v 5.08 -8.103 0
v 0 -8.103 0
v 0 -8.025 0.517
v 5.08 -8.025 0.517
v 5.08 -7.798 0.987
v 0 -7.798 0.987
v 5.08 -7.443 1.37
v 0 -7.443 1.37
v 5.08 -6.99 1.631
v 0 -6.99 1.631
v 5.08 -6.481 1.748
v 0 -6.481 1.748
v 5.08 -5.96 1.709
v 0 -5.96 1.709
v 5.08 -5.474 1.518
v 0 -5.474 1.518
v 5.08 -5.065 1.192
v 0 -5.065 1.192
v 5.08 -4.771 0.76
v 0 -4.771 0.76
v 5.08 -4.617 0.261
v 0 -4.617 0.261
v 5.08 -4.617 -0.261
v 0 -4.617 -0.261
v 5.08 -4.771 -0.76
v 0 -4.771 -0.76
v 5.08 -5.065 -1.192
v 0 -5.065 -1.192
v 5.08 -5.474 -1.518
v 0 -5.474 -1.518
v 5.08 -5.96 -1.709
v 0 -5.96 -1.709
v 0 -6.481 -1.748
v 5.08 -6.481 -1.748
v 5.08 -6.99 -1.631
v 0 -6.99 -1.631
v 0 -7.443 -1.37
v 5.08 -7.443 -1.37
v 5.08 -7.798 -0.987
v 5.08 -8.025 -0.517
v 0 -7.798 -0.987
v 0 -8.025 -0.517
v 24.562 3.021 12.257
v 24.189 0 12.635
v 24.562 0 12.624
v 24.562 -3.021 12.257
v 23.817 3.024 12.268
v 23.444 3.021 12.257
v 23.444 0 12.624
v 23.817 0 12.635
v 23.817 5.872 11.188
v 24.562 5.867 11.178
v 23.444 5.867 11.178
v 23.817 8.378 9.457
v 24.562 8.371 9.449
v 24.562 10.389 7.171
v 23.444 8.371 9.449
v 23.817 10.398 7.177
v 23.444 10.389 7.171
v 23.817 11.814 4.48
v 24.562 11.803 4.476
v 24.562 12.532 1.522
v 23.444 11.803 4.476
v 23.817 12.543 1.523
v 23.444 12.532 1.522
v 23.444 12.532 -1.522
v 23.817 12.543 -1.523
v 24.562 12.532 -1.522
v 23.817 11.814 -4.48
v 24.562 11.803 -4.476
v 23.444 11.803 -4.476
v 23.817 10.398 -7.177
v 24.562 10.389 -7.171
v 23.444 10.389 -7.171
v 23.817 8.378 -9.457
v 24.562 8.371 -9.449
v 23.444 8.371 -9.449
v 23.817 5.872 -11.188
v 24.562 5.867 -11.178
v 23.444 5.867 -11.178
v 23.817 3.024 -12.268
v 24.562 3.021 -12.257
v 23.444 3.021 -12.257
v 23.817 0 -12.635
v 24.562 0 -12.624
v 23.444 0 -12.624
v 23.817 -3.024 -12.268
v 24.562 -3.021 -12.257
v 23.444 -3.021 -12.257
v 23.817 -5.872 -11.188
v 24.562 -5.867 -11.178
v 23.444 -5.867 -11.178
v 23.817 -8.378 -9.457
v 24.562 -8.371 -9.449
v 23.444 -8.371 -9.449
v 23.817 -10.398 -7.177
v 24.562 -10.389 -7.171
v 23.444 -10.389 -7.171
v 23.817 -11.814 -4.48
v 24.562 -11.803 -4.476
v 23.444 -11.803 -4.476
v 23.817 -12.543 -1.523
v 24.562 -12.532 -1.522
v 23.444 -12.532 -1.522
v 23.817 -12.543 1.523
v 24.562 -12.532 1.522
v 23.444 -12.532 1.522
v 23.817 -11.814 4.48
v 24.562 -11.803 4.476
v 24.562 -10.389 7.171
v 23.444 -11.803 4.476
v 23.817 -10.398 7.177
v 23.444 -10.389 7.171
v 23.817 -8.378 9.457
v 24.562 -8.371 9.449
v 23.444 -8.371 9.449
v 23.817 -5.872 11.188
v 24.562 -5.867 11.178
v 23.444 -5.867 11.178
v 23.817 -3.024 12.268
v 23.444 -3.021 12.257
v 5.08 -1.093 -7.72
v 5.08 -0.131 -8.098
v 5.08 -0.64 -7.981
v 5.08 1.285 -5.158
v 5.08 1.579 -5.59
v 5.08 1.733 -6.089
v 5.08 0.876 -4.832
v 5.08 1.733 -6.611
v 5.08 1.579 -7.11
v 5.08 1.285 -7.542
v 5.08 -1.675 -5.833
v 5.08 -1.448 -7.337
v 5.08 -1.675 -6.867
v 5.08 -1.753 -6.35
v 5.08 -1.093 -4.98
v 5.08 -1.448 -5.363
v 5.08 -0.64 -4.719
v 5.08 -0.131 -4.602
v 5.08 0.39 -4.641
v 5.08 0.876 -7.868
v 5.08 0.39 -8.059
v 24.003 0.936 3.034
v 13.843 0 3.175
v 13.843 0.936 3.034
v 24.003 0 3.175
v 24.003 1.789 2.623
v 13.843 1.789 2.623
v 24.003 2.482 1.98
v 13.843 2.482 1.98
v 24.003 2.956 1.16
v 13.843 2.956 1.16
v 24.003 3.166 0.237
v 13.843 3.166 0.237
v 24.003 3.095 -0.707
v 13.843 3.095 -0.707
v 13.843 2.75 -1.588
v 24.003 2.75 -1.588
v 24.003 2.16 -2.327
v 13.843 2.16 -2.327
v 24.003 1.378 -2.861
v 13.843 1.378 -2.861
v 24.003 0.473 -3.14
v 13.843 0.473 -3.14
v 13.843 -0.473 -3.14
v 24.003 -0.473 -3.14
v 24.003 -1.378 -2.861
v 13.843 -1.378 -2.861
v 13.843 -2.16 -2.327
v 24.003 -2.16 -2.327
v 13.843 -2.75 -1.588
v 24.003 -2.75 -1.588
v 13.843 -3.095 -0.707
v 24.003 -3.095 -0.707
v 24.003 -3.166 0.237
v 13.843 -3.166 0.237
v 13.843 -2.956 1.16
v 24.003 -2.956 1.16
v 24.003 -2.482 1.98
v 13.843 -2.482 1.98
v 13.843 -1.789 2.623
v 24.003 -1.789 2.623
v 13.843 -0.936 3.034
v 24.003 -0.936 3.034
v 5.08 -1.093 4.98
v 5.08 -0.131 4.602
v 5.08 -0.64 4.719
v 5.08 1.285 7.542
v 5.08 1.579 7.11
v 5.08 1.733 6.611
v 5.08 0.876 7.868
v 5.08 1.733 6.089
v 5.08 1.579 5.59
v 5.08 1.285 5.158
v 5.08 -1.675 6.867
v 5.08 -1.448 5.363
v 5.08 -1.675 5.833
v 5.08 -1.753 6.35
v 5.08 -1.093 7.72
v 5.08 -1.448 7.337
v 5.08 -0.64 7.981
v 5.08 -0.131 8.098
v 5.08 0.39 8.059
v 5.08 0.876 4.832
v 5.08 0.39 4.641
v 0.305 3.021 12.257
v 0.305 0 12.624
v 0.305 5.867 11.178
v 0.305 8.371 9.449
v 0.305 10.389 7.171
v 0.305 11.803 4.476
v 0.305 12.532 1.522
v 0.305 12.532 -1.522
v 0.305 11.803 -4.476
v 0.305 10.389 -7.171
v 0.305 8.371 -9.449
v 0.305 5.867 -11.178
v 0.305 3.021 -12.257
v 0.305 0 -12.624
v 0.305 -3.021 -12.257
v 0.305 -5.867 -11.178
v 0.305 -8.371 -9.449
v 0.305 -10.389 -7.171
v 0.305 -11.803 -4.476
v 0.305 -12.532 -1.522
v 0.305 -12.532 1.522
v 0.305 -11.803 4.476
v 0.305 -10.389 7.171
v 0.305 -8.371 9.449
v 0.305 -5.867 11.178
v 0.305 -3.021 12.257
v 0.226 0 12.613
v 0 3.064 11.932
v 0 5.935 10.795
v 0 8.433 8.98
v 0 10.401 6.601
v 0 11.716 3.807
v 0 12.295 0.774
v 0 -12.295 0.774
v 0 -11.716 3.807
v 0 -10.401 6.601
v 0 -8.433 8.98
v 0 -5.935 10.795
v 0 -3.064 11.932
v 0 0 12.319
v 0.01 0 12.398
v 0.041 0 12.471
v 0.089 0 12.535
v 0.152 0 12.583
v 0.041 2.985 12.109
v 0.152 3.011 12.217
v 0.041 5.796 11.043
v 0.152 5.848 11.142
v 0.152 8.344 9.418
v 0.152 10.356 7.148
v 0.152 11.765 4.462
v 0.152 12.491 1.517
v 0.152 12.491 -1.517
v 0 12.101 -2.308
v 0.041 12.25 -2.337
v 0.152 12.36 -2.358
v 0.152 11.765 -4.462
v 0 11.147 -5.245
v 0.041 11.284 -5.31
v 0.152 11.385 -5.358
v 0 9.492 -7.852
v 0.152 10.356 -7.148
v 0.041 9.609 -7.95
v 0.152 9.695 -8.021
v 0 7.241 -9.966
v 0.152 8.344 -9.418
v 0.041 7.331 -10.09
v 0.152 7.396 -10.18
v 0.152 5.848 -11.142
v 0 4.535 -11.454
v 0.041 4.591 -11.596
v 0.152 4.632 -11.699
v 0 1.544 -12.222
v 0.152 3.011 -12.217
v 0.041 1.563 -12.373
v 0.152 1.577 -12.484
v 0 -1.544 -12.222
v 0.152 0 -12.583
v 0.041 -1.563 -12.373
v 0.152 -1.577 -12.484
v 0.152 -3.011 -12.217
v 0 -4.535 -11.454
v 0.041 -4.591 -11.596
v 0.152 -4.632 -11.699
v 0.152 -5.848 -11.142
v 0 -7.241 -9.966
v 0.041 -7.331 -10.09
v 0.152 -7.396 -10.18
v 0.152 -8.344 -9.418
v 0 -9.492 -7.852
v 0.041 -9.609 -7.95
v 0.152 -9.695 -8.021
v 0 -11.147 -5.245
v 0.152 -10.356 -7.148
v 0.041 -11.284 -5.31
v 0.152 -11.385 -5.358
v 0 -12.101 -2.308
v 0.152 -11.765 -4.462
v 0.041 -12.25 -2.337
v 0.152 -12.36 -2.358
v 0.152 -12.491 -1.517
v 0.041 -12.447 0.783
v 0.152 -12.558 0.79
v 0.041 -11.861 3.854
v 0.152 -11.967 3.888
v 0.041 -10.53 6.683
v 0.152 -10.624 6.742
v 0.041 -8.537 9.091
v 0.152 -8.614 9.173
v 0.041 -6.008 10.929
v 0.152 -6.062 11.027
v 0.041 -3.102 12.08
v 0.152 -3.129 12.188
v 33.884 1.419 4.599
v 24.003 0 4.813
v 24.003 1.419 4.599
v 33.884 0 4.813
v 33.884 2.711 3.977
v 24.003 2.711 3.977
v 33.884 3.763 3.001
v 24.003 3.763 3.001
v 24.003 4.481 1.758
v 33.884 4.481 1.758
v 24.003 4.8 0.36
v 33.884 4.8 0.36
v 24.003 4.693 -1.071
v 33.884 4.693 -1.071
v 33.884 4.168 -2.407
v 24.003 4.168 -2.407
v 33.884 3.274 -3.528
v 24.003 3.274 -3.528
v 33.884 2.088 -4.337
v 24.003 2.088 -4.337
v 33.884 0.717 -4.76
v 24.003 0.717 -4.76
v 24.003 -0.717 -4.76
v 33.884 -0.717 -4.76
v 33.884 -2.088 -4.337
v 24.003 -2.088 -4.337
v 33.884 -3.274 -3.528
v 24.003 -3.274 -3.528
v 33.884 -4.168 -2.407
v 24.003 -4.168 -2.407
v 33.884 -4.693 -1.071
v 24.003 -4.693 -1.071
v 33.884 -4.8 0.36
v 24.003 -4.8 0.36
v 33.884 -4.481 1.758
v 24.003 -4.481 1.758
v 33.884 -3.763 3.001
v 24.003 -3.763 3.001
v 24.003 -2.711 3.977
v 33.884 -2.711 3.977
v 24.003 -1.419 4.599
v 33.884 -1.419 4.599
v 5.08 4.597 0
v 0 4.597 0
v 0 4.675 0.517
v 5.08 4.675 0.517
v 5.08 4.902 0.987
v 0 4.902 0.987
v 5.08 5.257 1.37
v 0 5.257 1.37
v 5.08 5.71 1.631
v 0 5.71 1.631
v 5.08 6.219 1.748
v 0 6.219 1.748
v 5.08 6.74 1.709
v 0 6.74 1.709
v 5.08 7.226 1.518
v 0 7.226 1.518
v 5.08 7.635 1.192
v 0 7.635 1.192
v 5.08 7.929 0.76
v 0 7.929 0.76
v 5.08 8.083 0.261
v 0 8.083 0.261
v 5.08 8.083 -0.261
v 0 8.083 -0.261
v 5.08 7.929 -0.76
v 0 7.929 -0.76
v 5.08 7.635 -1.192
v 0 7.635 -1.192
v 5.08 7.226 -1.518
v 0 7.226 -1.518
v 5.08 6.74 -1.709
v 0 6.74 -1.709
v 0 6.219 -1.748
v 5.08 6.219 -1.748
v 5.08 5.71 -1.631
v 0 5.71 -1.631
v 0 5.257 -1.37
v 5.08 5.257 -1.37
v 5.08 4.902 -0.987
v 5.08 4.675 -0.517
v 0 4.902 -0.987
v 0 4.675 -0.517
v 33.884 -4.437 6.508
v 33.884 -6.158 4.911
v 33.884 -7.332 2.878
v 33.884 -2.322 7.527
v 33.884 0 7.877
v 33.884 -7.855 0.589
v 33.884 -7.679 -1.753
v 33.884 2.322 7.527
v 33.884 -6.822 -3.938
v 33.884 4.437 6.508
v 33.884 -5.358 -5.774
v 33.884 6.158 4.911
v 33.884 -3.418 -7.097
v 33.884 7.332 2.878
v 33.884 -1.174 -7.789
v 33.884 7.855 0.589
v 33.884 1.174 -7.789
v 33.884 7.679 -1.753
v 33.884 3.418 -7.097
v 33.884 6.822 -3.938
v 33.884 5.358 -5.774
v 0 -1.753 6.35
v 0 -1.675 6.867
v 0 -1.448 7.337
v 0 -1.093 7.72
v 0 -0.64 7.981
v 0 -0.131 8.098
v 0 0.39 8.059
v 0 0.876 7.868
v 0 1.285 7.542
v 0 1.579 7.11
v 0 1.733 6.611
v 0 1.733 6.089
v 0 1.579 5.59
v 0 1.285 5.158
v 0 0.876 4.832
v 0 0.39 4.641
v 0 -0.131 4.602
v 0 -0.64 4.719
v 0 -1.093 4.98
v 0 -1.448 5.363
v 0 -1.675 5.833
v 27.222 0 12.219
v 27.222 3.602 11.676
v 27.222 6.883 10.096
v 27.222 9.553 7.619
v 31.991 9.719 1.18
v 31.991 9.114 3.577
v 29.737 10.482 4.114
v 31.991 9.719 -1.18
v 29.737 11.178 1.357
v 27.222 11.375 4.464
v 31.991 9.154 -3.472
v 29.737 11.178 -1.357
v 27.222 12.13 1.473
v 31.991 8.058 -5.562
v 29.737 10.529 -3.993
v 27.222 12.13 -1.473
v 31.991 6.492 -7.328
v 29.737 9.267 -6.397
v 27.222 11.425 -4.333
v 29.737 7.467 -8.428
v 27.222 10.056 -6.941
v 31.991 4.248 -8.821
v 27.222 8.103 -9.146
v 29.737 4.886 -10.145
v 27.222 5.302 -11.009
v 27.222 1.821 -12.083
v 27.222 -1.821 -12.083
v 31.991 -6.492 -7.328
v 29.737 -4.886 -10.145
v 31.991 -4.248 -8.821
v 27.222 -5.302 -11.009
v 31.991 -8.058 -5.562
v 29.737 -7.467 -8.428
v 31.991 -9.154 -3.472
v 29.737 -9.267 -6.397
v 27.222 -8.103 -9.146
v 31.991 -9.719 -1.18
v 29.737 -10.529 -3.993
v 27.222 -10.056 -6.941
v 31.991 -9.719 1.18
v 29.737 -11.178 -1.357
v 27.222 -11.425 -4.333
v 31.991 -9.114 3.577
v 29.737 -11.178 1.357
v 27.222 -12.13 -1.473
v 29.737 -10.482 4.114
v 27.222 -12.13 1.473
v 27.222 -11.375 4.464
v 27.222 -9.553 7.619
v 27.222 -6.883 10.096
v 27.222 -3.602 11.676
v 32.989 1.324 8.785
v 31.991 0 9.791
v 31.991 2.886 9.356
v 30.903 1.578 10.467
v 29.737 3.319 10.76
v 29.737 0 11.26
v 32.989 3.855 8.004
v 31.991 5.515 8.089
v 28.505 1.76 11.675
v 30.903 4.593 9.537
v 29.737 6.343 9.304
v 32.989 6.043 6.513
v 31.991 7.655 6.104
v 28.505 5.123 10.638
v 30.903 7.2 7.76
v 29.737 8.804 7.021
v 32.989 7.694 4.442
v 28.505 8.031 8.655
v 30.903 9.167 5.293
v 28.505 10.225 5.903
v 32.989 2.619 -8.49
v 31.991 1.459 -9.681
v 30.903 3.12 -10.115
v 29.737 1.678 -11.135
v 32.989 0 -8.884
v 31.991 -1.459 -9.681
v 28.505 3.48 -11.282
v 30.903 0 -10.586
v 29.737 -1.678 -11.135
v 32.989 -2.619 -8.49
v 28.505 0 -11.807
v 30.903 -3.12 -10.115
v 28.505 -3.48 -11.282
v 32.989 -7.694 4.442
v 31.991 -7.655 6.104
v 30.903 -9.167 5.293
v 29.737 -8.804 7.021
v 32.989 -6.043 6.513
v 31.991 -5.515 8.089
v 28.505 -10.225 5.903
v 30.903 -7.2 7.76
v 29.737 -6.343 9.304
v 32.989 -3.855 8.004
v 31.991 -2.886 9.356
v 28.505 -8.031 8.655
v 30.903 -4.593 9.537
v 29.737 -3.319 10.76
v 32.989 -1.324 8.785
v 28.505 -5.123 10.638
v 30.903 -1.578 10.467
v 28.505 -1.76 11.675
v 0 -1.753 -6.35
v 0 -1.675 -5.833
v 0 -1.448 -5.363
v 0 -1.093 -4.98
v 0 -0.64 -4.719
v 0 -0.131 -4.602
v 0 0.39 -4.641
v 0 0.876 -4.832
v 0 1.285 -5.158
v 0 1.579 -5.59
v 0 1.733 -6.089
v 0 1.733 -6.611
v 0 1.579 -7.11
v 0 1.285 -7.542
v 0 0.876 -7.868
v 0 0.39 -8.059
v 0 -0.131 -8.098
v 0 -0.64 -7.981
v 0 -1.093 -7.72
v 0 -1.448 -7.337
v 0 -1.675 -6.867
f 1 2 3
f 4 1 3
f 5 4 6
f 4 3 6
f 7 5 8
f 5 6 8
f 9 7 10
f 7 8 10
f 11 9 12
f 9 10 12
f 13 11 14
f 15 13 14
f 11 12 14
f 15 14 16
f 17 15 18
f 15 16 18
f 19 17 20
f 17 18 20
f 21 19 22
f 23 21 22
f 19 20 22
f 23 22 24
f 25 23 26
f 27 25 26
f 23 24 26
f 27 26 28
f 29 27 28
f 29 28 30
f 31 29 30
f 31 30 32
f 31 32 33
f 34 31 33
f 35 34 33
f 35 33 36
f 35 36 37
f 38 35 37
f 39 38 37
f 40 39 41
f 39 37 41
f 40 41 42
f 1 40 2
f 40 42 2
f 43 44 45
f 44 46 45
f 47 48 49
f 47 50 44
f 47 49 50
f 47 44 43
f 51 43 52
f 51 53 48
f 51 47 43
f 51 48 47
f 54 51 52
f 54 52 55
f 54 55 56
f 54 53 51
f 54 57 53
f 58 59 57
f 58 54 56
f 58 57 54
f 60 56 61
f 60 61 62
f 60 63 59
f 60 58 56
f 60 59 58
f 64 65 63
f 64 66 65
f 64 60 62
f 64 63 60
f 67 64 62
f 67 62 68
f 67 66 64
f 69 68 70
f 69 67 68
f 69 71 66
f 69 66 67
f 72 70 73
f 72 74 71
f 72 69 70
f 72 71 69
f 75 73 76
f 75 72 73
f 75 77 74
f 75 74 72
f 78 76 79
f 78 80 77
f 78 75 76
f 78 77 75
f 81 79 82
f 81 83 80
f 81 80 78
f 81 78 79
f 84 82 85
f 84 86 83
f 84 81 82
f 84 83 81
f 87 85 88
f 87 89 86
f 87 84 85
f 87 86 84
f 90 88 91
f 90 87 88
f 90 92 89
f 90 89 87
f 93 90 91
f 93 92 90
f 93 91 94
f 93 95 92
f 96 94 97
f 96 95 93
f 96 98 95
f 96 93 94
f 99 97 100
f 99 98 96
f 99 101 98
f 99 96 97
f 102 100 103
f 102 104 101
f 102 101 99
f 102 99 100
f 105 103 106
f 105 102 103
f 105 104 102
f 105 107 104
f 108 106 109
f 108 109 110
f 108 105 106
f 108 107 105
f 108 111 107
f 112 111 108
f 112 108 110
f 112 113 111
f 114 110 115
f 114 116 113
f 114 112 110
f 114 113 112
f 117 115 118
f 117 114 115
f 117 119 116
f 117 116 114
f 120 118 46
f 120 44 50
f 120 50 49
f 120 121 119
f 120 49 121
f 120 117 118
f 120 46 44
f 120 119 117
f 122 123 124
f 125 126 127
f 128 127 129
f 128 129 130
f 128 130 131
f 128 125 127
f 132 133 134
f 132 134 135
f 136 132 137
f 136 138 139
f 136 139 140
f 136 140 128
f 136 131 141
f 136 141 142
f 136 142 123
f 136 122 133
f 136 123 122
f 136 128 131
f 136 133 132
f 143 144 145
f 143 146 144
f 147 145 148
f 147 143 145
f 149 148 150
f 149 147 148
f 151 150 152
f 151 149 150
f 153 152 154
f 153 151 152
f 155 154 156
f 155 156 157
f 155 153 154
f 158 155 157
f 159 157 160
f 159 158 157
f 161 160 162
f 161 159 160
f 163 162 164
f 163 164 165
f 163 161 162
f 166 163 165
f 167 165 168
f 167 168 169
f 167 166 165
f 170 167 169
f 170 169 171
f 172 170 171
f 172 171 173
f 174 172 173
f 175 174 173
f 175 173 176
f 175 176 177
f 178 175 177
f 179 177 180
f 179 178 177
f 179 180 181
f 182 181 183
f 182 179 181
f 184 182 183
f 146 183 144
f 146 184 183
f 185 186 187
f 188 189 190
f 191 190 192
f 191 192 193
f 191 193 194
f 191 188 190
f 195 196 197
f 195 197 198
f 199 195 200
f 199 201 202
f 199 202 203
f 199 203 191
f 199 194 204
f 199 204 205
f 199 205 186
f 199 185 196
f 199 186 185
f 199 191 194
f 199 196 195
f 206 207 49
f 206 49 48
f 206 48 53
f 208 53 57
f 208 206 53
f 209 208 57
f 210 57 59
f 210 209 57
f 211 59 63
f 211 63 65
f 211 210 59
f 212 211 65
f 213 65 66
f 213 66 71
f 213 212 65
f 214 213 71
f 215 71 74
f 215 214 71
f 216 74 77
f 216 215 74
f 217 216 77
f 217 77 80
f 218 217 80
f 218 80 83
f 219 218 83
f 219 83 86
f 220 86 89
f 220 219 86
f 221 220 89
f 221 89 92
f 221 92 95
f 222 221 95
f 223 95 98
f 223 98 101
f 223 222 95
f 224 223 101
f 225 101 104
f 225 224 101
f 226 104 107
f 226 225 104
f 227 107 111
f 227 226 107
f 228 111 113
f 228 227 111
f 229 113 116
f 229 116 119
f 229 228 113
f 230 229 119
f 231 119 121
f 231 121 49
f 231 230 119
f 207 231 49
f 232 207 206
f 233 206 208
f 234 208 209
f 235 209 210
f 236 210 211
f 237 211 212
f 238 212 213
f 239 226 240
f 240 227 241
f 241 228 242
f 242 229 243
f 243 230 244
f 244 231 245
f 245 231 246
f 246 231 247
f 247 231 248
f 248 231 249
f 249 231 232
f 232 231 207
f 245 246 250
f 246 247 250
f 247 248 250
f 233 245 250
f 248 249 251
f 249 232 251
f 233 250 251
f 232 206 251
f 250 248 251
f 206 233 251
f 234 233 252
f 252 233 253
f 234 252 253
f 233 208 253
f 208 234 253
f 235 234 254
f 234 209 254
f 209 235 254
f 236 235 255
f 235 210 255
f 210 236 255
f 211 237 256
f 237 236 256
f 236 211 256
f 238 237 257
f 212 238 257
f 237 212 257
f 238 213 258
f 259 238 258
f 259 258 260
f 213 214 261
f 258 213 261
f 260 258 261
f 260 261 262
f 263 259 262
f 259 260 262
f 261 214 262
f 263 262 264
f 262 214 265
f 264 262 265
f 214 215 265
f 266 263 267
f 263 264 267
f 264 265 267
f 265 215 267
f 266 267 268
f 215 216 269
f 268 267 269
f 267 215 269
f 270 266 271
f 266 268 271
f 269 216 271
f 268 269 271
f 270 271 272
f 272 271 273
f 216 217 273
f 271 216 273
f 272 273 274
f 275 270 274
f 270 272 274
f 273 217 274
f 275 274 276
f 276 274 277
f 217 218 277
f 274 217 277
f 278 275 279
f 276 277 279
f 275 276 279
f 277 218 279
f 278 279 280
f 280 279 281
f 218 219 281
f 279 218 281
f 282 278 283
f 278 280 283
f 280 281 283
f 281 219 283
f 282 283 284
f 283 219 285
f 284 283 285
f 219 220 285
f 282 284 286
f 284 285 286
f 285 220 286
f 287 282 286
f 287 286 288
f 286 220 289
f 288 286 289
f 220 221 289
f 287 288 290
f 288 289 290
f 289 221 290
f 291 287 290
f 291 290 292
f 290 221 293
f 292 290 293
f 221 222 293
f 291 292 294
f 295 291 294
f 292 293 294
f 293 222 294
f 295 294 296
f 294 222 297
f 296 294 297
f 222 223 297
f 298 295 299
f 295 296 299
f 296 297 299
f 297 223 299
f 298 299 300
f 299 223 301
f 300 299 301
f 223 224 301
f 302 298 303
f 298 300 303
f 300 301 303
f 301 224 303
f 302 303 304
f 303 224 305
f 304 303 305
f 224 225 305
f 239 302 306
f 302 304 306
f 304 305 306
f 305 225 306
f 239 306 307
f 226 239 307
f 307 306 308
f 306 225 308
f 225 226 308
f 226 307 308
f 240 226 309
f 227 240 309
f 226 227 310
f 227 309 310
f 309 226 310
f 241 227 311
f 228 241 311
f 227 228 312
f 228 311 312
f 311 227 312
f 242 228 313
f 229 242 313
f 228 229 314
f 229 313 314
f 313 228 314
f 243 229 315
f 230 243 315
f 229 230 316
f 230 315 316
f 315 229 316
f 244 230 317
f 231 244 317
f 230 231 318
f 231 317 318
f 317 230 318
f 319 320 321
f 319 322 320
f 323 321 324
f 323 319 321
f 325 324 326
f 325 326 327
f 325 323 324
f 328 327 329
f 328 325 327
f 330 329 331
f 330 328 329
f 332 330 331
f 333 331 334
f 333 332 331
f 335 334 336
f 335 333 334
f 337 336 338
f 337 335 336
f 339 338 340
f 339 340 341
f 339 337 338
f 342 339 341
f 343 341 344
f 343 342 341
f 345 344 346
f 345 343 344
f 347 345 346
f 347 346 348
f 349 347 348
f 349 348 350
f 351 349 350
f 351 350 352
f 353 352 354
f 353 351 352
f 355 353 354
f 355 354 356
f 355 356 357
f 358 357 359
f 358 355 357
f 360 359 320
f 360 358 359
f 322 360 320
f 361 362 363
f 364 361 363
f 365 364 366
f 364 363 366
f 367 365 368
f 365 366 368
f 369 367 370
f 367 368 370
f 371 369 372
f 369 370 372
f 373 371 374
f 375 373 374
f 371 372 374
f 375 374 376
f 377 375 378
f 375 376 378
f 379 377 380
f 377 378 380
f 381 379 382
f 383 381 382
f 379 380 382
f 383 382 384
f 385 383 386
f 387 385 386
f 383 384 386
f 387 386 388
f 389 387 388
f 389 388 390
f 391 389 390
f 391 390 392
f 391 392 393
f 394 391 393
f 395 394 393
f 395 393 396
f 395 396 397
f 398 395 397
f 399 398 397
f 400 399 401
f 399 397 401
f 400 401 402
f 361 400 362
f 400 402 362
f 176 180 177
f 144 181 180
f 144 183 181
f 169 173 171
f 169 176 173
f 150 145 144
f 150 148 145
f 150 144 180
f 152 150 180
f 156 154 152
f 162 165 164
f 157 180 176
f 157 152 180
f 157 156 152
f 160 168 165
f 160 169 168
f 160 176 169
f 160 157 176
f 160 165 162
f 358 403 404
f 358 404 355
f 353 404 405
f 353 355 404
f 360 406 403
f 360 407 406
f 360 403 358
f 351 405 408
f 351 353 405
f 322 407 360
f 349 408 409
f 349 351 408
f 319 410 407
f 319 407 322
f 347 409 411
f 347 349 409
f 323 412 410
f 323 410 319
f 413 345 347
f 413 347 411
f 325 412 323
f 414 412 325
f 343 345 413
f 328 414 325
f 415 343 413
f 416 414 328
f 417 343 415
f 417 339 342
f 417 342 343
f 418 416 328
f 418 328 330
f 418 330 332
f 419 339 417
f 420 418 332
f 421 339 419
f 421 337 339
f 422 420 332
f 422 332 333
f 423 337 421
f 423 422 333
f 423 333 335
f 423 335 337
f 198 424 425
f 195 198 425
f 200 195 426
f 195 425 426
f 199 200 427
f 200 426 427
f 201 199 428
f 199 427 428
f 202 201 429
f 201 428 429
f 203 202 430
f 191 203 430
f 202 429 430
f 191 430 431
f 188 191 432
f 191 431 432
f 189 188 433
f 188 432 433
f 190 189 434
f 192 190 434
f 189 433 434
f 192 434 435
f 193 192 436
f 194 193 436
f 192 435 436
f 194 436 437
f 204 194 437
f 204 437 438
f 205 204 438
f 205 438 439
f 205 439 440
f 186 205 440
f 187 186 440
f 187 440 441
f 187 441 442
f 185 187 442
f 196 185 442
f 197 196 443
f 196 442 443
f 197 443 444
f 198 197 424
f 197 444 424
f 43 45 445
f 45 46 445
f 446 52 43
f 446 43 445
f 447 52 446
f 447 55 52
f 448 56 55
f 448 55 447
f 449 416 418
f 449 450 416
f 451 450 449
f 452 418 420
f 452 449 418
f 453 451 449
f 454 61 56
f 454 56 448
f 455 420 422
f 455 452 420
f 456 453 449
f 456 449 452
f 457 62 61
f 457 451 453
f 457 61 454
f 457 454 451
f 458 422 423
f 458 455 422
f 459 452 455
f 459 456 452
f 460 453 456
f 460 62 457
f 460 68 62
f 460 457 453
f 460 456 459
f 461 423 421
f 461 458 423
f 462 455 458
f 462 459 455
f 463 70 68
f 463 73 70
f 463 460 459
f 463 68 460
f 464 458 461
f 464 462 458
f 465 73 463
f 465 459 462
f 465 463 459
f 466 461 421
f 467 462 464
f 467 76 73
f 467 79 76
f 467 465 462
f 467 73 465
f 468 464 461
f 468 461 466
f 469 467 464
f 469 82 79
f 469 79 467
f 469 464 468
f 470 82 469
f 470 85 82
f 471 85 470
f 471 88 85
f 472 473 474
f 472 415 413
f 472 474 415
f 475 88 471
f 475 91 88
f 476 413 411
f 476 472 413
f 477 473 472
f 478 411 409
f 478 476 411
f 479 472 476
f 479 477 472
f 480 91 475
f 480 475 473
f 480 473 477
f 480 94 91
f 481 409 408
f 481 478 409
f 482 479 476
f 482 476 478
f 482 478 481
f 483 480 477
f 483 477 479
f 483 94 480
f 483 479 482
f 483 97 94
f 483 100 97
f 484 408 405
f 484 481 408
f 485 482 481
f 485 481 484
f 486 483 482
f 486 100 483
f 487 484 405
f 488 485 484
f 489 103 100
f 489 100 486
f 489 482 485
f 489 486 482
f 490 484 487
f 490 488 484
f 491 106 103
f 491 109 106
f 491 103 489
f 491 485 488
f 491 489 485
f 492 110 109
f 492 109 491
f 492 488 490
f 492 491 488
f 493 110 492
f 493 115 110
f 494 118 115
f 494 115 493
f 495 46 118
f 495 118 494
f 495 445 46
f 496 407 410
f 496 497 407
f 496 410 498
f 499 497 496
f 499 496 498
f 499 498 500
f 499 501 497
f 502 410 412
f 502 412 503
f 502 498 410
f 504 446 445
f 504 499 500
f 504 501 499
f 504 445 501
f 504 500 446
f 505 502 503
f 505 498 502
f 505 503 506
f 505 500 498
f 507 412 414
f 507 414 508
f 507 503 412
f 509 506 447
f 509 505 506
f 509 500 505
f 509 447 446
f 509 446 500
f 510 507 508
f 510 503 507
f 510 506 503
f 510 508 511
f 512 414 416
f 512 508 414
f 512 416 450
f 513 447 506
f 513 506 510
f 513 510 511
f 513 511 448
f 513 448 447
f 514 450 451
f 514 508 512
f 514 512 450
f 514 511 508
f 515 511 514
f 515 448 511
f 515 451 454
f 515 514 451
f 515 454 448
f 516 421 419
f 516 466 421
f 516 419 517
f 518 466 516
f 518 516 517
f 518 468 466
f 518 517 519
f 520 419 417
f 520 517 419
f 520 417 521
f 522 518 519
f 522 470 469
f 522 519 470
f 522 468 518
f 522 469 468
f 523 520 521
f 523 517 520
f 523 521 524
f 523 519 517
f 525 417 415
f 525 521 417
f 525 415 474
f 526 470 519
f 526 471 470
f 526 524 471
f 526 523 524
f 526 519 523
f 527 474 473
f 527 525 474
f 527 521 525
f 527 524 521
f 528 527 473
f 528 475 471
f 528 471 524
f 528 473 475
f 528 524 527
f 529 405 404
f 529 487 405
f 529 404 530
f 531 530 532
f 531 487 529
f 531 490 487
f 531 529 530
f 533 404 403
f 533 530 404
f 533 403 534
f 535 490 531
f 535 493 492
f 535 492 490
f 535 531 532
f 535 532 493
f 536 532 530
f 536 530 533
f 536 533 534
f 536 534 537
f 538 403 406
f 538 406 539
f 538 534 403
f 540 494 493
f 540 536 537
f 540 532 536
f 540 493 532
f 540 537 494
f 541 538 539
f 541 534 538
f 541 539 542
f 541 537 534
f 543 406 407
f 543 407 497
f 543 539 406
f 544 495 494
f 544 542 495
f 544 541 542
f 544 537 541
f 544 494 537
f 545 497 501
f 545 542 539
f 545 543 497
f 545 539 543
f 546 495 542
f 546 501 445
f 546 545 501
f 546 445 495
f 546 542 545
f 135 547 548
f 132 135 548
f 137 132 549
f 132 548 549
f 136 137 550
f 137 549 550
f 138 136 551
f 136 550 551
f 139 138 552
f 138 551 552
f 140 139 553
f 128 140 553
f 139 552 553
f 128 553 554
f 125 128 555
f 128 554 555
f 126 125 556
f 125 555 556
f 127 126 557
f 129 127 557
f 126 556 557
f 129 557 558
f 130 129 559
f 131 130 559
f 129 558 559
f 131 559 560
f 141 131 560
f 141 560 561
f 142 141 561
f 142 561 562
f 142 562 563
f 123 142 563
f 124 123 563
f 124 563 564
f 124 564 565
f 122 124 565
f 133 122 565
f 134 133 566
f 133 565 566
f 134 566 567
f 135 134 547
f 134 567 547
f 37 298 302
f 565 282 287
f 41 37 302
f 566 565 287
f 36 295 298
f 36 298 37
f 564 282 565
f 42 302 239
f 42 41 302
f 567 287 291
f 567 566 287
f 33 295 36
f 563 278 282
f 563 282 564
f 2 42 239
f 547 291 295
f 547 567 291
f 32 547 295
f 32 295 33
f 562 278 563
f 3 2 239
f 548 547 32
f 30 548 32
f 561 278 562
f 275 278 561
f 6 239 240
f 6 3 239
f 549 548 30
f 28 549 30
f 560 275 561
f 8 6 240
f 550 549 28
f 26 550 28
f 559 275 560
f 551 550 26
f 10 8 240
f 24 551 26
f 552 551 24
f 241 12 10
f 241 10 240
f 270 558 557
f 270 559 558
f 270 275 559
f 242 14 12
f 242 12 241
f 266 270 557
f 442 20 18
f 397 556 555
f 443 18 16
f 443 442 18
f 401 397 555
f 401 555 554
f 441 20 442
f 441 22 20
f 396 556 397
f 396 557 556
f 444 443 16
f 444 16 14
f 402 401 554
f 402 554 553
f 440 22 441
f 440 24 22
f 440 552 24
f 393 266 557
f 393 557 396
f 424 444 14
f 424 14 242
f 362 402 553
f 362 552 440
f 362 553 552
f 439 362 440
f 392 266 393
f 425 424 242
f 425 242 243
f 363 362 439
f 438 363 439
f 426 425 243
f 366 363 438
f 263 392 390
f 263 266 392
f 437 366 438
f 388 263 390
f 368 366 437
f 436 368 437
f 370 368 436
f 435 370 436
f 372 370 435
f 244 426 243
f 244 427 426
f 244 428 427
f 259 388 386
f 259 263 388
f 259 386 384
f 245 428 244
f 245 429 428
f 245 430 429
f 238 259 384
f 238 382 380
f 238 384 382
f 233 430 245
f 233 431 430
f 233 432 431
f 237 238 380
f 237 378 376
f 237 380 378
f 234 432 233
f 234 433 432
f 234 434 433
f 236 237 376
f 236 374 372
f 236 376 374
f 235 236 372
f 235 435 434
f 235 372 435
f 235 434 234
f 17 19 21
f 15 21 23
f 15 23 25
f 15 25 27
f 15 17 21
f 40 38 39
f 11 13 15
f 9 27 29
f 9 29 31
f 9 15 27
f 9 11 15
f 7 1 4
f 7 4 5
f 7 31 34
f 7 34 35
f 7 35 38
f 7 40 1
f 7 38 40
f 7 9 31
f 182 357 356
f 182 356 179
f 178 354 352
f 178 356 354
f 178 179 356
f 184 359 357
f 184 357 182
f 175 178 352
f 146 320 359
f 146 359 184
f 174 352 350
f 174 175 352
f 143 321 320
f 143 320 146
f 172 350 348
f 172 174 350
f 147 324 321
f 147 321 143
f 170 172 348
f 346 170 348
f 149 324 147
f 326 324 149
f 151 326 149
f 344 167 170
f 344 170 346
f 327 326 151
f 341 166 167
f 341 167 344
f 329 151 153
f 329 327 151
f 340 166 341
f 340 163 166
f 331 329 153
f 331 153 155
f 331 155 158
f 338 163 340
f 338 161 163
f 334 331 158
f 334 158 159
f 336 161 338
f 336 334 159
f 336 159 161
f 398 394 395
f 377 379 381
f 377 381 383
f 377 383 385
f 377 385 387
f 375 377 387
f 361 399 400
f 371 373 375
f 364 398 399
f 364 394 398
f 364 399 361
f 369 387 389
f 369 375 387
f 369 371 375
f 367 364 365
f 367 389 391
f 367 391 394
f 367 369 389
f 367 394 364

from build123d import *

# Parameters (mm, degrees)
F2_R     = 1.7526
F3_DEPTH = 5.08
F4_R     = 0.3048


with BuildPart() as f1:
    # F0 (on Front) → F1 (revolve)
    with BuildSketch(Plane.XZ):
        Polygon((0, 12.6238), (0, 0), (13.843, 0), (13.843, 3.175), (24.003, 3.175), (24.003, 4.8133), (24.5618, 4.8133), (24.5618, 12.6238), (23.4442, 12.6238), align=None)
        with BuildLine():
            ThreePointArc((24.5618, 12.6238), (24.003, 12.636162), (23.4442, 12.6238))
            Line((23.4442, 12.6238), (24.5618, 12.6238))
        make_face()
        with BuildLine():
            ThreePointArc((33.8836, 7.876949), (29.73697, 11.260292), (24.5618, 12.6238))
            Line((24.5618, 12.6238), (24.5618, 4.8133))
            Line((24.5618, 4.8133), (33.8836, 4.8133))
            Line((33.8836, 4.8133), (33.8836, 7.876949))
        make_face()
    revolve(axis=Axis((6.9215, 0, 0), (-1, 0, 0)))

    # F2 (on face) → F3 (cut)
    with BuildSketch(Plane(origin=(0, 0, 0), x_dir=(0, -1, 0), z_dir=(-1, 0, 0))):
        with Locations((0, 6.35)):
            Circle(F2_R)
        with Locations((-6.35, 0)):
            Circle(F2_R)
        with Locations((0, -6.35)):
            Circle(F2_R)
        with Locations((6.35, 0)):
            Circle(F2_R)
    extrude(amount=-F3_DEPTH, mode=Mode.SUBTRACT)

    # F4
    f4_edges = [f1.edges().sort_by_distance(p)[0] for p in [
        (0, 0, -12.6238),
    ]]
    fillet(f4_edges, radius=F4_R)


solid = f1.part
